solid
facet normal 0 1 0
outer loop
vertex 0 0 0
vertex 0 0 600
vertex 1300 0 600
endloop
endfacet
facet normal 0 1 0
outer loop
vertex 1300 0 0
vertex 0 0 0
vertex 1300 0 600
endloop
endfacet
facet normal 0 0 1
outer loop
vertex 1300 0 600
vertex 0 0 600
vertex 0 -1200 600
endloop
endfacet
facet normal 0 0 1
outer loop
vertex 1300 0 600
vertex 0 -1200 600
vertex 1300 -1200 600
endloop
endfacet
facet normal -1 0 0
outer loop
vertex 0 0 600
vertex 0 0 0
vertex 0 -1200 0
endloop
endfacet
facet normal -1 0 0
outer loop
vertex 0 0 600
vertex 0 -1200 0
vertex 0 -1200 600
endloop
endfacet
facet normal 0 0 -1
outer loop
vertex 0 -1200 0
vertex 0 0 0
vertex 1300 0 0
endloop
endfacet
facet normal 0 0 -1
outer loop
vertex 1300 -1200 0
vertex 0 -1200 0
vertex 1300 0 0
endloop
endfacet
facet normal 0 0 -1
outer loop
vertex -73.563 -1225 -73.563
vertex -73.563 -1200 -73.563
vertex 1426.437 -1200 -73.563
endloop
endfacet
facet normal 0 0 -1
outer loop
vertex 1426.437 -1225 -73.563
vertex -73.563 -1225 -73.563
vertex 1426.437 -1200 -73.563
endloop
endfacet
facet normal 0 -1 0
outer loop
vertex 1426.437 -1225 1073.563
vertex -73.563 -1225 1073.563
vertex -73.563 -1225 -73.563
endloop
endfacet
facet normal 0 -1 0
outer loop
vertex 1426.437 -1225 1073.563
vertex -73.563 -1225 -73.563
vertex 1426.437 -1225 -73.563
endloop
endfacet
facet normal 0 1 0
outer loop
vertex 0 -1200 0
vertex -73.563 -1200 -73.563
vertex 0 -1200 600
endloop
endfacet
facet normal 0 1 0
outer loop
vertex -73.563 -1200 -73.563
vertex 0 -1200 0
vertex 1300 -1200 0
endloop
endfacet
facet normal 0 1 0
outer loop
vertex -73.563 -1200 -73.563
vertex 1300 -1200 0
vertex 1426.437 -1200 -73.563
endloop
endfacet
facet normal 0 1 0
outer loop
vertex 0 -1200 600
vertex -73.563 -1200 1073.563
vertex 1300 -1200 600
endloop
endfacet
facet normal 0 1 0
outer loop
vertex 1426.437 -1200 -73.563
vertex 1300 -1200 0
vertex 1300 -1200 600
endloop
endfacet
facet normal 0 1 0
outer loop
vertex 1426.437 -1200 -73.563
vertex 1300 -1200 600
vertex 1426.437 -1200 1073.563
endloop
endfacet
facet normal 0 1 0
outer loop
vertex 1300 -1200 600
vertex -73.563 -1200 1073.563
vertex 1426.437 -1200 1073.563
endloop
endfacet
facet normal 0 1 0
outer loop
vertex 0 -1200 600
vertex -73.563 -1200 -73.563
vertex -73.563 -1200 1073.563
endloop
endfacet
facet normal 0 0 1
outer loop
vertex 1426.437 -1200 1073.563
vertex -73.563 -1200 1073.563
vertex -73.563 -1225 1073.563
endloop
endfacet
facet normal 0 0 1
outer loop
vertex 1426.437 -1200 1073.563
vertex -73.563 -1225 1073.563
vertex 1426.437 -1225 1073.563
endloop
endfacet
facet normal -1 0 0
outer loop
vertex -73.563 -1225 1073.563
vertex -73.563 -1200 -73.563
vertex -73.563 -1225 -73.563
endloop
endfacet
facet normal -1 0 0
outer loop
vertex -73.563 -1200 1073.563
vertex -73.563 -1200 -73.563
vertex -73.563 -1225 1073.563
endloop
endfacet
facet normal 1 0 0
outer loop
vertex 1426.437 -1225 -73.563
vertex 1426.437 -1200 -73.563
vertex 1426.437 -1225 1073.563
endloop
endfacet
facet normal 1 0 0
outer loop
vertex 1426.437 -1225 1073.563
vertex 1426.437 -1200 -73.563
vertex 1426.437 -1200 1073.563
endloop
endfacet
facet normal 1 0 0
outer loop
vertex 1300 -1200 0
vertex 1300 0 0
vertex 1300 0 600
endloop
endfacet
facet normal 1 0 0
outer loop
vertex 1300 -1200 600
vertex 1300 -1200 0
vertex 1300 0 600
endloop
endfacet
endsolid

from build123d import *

# Parameters (mm, degrees)
F0_W     = 1300
F0_H     = 600
F1_DEPTH = 1200
F2_W     = 1500
F2_H     = 1147.1251249313
F2_W_2   = 1300
F2_H_2   = 600
F3_DEPTH = 25


with BuildPart() as f1:
    # F0 (on Front) → F1 (new body)
    with BuildSketch(Plane.XZ):
        with Locations((650, 300)):
            Rectangle(F0_W, F0_H)
    extrude(amount=F1_DEPTH)

    # F2 (on face) → F3 (join)
    with BuildSketch(Plane.XZ.offset(1200)):
        with Locations((676.4374375343, 500)):
            Rectangle(F2_W, F2_H)
        with Locations((650, 300)):
            Rectangle(F2_W_2, F2_H_2, mode=Mode.SUBTRACT)
        with Locations((650, 300)):
            Rectangle(F2_W_2, F2_H_2)
    extrude(amount=F3_DEPTH)


solid = f1.part
